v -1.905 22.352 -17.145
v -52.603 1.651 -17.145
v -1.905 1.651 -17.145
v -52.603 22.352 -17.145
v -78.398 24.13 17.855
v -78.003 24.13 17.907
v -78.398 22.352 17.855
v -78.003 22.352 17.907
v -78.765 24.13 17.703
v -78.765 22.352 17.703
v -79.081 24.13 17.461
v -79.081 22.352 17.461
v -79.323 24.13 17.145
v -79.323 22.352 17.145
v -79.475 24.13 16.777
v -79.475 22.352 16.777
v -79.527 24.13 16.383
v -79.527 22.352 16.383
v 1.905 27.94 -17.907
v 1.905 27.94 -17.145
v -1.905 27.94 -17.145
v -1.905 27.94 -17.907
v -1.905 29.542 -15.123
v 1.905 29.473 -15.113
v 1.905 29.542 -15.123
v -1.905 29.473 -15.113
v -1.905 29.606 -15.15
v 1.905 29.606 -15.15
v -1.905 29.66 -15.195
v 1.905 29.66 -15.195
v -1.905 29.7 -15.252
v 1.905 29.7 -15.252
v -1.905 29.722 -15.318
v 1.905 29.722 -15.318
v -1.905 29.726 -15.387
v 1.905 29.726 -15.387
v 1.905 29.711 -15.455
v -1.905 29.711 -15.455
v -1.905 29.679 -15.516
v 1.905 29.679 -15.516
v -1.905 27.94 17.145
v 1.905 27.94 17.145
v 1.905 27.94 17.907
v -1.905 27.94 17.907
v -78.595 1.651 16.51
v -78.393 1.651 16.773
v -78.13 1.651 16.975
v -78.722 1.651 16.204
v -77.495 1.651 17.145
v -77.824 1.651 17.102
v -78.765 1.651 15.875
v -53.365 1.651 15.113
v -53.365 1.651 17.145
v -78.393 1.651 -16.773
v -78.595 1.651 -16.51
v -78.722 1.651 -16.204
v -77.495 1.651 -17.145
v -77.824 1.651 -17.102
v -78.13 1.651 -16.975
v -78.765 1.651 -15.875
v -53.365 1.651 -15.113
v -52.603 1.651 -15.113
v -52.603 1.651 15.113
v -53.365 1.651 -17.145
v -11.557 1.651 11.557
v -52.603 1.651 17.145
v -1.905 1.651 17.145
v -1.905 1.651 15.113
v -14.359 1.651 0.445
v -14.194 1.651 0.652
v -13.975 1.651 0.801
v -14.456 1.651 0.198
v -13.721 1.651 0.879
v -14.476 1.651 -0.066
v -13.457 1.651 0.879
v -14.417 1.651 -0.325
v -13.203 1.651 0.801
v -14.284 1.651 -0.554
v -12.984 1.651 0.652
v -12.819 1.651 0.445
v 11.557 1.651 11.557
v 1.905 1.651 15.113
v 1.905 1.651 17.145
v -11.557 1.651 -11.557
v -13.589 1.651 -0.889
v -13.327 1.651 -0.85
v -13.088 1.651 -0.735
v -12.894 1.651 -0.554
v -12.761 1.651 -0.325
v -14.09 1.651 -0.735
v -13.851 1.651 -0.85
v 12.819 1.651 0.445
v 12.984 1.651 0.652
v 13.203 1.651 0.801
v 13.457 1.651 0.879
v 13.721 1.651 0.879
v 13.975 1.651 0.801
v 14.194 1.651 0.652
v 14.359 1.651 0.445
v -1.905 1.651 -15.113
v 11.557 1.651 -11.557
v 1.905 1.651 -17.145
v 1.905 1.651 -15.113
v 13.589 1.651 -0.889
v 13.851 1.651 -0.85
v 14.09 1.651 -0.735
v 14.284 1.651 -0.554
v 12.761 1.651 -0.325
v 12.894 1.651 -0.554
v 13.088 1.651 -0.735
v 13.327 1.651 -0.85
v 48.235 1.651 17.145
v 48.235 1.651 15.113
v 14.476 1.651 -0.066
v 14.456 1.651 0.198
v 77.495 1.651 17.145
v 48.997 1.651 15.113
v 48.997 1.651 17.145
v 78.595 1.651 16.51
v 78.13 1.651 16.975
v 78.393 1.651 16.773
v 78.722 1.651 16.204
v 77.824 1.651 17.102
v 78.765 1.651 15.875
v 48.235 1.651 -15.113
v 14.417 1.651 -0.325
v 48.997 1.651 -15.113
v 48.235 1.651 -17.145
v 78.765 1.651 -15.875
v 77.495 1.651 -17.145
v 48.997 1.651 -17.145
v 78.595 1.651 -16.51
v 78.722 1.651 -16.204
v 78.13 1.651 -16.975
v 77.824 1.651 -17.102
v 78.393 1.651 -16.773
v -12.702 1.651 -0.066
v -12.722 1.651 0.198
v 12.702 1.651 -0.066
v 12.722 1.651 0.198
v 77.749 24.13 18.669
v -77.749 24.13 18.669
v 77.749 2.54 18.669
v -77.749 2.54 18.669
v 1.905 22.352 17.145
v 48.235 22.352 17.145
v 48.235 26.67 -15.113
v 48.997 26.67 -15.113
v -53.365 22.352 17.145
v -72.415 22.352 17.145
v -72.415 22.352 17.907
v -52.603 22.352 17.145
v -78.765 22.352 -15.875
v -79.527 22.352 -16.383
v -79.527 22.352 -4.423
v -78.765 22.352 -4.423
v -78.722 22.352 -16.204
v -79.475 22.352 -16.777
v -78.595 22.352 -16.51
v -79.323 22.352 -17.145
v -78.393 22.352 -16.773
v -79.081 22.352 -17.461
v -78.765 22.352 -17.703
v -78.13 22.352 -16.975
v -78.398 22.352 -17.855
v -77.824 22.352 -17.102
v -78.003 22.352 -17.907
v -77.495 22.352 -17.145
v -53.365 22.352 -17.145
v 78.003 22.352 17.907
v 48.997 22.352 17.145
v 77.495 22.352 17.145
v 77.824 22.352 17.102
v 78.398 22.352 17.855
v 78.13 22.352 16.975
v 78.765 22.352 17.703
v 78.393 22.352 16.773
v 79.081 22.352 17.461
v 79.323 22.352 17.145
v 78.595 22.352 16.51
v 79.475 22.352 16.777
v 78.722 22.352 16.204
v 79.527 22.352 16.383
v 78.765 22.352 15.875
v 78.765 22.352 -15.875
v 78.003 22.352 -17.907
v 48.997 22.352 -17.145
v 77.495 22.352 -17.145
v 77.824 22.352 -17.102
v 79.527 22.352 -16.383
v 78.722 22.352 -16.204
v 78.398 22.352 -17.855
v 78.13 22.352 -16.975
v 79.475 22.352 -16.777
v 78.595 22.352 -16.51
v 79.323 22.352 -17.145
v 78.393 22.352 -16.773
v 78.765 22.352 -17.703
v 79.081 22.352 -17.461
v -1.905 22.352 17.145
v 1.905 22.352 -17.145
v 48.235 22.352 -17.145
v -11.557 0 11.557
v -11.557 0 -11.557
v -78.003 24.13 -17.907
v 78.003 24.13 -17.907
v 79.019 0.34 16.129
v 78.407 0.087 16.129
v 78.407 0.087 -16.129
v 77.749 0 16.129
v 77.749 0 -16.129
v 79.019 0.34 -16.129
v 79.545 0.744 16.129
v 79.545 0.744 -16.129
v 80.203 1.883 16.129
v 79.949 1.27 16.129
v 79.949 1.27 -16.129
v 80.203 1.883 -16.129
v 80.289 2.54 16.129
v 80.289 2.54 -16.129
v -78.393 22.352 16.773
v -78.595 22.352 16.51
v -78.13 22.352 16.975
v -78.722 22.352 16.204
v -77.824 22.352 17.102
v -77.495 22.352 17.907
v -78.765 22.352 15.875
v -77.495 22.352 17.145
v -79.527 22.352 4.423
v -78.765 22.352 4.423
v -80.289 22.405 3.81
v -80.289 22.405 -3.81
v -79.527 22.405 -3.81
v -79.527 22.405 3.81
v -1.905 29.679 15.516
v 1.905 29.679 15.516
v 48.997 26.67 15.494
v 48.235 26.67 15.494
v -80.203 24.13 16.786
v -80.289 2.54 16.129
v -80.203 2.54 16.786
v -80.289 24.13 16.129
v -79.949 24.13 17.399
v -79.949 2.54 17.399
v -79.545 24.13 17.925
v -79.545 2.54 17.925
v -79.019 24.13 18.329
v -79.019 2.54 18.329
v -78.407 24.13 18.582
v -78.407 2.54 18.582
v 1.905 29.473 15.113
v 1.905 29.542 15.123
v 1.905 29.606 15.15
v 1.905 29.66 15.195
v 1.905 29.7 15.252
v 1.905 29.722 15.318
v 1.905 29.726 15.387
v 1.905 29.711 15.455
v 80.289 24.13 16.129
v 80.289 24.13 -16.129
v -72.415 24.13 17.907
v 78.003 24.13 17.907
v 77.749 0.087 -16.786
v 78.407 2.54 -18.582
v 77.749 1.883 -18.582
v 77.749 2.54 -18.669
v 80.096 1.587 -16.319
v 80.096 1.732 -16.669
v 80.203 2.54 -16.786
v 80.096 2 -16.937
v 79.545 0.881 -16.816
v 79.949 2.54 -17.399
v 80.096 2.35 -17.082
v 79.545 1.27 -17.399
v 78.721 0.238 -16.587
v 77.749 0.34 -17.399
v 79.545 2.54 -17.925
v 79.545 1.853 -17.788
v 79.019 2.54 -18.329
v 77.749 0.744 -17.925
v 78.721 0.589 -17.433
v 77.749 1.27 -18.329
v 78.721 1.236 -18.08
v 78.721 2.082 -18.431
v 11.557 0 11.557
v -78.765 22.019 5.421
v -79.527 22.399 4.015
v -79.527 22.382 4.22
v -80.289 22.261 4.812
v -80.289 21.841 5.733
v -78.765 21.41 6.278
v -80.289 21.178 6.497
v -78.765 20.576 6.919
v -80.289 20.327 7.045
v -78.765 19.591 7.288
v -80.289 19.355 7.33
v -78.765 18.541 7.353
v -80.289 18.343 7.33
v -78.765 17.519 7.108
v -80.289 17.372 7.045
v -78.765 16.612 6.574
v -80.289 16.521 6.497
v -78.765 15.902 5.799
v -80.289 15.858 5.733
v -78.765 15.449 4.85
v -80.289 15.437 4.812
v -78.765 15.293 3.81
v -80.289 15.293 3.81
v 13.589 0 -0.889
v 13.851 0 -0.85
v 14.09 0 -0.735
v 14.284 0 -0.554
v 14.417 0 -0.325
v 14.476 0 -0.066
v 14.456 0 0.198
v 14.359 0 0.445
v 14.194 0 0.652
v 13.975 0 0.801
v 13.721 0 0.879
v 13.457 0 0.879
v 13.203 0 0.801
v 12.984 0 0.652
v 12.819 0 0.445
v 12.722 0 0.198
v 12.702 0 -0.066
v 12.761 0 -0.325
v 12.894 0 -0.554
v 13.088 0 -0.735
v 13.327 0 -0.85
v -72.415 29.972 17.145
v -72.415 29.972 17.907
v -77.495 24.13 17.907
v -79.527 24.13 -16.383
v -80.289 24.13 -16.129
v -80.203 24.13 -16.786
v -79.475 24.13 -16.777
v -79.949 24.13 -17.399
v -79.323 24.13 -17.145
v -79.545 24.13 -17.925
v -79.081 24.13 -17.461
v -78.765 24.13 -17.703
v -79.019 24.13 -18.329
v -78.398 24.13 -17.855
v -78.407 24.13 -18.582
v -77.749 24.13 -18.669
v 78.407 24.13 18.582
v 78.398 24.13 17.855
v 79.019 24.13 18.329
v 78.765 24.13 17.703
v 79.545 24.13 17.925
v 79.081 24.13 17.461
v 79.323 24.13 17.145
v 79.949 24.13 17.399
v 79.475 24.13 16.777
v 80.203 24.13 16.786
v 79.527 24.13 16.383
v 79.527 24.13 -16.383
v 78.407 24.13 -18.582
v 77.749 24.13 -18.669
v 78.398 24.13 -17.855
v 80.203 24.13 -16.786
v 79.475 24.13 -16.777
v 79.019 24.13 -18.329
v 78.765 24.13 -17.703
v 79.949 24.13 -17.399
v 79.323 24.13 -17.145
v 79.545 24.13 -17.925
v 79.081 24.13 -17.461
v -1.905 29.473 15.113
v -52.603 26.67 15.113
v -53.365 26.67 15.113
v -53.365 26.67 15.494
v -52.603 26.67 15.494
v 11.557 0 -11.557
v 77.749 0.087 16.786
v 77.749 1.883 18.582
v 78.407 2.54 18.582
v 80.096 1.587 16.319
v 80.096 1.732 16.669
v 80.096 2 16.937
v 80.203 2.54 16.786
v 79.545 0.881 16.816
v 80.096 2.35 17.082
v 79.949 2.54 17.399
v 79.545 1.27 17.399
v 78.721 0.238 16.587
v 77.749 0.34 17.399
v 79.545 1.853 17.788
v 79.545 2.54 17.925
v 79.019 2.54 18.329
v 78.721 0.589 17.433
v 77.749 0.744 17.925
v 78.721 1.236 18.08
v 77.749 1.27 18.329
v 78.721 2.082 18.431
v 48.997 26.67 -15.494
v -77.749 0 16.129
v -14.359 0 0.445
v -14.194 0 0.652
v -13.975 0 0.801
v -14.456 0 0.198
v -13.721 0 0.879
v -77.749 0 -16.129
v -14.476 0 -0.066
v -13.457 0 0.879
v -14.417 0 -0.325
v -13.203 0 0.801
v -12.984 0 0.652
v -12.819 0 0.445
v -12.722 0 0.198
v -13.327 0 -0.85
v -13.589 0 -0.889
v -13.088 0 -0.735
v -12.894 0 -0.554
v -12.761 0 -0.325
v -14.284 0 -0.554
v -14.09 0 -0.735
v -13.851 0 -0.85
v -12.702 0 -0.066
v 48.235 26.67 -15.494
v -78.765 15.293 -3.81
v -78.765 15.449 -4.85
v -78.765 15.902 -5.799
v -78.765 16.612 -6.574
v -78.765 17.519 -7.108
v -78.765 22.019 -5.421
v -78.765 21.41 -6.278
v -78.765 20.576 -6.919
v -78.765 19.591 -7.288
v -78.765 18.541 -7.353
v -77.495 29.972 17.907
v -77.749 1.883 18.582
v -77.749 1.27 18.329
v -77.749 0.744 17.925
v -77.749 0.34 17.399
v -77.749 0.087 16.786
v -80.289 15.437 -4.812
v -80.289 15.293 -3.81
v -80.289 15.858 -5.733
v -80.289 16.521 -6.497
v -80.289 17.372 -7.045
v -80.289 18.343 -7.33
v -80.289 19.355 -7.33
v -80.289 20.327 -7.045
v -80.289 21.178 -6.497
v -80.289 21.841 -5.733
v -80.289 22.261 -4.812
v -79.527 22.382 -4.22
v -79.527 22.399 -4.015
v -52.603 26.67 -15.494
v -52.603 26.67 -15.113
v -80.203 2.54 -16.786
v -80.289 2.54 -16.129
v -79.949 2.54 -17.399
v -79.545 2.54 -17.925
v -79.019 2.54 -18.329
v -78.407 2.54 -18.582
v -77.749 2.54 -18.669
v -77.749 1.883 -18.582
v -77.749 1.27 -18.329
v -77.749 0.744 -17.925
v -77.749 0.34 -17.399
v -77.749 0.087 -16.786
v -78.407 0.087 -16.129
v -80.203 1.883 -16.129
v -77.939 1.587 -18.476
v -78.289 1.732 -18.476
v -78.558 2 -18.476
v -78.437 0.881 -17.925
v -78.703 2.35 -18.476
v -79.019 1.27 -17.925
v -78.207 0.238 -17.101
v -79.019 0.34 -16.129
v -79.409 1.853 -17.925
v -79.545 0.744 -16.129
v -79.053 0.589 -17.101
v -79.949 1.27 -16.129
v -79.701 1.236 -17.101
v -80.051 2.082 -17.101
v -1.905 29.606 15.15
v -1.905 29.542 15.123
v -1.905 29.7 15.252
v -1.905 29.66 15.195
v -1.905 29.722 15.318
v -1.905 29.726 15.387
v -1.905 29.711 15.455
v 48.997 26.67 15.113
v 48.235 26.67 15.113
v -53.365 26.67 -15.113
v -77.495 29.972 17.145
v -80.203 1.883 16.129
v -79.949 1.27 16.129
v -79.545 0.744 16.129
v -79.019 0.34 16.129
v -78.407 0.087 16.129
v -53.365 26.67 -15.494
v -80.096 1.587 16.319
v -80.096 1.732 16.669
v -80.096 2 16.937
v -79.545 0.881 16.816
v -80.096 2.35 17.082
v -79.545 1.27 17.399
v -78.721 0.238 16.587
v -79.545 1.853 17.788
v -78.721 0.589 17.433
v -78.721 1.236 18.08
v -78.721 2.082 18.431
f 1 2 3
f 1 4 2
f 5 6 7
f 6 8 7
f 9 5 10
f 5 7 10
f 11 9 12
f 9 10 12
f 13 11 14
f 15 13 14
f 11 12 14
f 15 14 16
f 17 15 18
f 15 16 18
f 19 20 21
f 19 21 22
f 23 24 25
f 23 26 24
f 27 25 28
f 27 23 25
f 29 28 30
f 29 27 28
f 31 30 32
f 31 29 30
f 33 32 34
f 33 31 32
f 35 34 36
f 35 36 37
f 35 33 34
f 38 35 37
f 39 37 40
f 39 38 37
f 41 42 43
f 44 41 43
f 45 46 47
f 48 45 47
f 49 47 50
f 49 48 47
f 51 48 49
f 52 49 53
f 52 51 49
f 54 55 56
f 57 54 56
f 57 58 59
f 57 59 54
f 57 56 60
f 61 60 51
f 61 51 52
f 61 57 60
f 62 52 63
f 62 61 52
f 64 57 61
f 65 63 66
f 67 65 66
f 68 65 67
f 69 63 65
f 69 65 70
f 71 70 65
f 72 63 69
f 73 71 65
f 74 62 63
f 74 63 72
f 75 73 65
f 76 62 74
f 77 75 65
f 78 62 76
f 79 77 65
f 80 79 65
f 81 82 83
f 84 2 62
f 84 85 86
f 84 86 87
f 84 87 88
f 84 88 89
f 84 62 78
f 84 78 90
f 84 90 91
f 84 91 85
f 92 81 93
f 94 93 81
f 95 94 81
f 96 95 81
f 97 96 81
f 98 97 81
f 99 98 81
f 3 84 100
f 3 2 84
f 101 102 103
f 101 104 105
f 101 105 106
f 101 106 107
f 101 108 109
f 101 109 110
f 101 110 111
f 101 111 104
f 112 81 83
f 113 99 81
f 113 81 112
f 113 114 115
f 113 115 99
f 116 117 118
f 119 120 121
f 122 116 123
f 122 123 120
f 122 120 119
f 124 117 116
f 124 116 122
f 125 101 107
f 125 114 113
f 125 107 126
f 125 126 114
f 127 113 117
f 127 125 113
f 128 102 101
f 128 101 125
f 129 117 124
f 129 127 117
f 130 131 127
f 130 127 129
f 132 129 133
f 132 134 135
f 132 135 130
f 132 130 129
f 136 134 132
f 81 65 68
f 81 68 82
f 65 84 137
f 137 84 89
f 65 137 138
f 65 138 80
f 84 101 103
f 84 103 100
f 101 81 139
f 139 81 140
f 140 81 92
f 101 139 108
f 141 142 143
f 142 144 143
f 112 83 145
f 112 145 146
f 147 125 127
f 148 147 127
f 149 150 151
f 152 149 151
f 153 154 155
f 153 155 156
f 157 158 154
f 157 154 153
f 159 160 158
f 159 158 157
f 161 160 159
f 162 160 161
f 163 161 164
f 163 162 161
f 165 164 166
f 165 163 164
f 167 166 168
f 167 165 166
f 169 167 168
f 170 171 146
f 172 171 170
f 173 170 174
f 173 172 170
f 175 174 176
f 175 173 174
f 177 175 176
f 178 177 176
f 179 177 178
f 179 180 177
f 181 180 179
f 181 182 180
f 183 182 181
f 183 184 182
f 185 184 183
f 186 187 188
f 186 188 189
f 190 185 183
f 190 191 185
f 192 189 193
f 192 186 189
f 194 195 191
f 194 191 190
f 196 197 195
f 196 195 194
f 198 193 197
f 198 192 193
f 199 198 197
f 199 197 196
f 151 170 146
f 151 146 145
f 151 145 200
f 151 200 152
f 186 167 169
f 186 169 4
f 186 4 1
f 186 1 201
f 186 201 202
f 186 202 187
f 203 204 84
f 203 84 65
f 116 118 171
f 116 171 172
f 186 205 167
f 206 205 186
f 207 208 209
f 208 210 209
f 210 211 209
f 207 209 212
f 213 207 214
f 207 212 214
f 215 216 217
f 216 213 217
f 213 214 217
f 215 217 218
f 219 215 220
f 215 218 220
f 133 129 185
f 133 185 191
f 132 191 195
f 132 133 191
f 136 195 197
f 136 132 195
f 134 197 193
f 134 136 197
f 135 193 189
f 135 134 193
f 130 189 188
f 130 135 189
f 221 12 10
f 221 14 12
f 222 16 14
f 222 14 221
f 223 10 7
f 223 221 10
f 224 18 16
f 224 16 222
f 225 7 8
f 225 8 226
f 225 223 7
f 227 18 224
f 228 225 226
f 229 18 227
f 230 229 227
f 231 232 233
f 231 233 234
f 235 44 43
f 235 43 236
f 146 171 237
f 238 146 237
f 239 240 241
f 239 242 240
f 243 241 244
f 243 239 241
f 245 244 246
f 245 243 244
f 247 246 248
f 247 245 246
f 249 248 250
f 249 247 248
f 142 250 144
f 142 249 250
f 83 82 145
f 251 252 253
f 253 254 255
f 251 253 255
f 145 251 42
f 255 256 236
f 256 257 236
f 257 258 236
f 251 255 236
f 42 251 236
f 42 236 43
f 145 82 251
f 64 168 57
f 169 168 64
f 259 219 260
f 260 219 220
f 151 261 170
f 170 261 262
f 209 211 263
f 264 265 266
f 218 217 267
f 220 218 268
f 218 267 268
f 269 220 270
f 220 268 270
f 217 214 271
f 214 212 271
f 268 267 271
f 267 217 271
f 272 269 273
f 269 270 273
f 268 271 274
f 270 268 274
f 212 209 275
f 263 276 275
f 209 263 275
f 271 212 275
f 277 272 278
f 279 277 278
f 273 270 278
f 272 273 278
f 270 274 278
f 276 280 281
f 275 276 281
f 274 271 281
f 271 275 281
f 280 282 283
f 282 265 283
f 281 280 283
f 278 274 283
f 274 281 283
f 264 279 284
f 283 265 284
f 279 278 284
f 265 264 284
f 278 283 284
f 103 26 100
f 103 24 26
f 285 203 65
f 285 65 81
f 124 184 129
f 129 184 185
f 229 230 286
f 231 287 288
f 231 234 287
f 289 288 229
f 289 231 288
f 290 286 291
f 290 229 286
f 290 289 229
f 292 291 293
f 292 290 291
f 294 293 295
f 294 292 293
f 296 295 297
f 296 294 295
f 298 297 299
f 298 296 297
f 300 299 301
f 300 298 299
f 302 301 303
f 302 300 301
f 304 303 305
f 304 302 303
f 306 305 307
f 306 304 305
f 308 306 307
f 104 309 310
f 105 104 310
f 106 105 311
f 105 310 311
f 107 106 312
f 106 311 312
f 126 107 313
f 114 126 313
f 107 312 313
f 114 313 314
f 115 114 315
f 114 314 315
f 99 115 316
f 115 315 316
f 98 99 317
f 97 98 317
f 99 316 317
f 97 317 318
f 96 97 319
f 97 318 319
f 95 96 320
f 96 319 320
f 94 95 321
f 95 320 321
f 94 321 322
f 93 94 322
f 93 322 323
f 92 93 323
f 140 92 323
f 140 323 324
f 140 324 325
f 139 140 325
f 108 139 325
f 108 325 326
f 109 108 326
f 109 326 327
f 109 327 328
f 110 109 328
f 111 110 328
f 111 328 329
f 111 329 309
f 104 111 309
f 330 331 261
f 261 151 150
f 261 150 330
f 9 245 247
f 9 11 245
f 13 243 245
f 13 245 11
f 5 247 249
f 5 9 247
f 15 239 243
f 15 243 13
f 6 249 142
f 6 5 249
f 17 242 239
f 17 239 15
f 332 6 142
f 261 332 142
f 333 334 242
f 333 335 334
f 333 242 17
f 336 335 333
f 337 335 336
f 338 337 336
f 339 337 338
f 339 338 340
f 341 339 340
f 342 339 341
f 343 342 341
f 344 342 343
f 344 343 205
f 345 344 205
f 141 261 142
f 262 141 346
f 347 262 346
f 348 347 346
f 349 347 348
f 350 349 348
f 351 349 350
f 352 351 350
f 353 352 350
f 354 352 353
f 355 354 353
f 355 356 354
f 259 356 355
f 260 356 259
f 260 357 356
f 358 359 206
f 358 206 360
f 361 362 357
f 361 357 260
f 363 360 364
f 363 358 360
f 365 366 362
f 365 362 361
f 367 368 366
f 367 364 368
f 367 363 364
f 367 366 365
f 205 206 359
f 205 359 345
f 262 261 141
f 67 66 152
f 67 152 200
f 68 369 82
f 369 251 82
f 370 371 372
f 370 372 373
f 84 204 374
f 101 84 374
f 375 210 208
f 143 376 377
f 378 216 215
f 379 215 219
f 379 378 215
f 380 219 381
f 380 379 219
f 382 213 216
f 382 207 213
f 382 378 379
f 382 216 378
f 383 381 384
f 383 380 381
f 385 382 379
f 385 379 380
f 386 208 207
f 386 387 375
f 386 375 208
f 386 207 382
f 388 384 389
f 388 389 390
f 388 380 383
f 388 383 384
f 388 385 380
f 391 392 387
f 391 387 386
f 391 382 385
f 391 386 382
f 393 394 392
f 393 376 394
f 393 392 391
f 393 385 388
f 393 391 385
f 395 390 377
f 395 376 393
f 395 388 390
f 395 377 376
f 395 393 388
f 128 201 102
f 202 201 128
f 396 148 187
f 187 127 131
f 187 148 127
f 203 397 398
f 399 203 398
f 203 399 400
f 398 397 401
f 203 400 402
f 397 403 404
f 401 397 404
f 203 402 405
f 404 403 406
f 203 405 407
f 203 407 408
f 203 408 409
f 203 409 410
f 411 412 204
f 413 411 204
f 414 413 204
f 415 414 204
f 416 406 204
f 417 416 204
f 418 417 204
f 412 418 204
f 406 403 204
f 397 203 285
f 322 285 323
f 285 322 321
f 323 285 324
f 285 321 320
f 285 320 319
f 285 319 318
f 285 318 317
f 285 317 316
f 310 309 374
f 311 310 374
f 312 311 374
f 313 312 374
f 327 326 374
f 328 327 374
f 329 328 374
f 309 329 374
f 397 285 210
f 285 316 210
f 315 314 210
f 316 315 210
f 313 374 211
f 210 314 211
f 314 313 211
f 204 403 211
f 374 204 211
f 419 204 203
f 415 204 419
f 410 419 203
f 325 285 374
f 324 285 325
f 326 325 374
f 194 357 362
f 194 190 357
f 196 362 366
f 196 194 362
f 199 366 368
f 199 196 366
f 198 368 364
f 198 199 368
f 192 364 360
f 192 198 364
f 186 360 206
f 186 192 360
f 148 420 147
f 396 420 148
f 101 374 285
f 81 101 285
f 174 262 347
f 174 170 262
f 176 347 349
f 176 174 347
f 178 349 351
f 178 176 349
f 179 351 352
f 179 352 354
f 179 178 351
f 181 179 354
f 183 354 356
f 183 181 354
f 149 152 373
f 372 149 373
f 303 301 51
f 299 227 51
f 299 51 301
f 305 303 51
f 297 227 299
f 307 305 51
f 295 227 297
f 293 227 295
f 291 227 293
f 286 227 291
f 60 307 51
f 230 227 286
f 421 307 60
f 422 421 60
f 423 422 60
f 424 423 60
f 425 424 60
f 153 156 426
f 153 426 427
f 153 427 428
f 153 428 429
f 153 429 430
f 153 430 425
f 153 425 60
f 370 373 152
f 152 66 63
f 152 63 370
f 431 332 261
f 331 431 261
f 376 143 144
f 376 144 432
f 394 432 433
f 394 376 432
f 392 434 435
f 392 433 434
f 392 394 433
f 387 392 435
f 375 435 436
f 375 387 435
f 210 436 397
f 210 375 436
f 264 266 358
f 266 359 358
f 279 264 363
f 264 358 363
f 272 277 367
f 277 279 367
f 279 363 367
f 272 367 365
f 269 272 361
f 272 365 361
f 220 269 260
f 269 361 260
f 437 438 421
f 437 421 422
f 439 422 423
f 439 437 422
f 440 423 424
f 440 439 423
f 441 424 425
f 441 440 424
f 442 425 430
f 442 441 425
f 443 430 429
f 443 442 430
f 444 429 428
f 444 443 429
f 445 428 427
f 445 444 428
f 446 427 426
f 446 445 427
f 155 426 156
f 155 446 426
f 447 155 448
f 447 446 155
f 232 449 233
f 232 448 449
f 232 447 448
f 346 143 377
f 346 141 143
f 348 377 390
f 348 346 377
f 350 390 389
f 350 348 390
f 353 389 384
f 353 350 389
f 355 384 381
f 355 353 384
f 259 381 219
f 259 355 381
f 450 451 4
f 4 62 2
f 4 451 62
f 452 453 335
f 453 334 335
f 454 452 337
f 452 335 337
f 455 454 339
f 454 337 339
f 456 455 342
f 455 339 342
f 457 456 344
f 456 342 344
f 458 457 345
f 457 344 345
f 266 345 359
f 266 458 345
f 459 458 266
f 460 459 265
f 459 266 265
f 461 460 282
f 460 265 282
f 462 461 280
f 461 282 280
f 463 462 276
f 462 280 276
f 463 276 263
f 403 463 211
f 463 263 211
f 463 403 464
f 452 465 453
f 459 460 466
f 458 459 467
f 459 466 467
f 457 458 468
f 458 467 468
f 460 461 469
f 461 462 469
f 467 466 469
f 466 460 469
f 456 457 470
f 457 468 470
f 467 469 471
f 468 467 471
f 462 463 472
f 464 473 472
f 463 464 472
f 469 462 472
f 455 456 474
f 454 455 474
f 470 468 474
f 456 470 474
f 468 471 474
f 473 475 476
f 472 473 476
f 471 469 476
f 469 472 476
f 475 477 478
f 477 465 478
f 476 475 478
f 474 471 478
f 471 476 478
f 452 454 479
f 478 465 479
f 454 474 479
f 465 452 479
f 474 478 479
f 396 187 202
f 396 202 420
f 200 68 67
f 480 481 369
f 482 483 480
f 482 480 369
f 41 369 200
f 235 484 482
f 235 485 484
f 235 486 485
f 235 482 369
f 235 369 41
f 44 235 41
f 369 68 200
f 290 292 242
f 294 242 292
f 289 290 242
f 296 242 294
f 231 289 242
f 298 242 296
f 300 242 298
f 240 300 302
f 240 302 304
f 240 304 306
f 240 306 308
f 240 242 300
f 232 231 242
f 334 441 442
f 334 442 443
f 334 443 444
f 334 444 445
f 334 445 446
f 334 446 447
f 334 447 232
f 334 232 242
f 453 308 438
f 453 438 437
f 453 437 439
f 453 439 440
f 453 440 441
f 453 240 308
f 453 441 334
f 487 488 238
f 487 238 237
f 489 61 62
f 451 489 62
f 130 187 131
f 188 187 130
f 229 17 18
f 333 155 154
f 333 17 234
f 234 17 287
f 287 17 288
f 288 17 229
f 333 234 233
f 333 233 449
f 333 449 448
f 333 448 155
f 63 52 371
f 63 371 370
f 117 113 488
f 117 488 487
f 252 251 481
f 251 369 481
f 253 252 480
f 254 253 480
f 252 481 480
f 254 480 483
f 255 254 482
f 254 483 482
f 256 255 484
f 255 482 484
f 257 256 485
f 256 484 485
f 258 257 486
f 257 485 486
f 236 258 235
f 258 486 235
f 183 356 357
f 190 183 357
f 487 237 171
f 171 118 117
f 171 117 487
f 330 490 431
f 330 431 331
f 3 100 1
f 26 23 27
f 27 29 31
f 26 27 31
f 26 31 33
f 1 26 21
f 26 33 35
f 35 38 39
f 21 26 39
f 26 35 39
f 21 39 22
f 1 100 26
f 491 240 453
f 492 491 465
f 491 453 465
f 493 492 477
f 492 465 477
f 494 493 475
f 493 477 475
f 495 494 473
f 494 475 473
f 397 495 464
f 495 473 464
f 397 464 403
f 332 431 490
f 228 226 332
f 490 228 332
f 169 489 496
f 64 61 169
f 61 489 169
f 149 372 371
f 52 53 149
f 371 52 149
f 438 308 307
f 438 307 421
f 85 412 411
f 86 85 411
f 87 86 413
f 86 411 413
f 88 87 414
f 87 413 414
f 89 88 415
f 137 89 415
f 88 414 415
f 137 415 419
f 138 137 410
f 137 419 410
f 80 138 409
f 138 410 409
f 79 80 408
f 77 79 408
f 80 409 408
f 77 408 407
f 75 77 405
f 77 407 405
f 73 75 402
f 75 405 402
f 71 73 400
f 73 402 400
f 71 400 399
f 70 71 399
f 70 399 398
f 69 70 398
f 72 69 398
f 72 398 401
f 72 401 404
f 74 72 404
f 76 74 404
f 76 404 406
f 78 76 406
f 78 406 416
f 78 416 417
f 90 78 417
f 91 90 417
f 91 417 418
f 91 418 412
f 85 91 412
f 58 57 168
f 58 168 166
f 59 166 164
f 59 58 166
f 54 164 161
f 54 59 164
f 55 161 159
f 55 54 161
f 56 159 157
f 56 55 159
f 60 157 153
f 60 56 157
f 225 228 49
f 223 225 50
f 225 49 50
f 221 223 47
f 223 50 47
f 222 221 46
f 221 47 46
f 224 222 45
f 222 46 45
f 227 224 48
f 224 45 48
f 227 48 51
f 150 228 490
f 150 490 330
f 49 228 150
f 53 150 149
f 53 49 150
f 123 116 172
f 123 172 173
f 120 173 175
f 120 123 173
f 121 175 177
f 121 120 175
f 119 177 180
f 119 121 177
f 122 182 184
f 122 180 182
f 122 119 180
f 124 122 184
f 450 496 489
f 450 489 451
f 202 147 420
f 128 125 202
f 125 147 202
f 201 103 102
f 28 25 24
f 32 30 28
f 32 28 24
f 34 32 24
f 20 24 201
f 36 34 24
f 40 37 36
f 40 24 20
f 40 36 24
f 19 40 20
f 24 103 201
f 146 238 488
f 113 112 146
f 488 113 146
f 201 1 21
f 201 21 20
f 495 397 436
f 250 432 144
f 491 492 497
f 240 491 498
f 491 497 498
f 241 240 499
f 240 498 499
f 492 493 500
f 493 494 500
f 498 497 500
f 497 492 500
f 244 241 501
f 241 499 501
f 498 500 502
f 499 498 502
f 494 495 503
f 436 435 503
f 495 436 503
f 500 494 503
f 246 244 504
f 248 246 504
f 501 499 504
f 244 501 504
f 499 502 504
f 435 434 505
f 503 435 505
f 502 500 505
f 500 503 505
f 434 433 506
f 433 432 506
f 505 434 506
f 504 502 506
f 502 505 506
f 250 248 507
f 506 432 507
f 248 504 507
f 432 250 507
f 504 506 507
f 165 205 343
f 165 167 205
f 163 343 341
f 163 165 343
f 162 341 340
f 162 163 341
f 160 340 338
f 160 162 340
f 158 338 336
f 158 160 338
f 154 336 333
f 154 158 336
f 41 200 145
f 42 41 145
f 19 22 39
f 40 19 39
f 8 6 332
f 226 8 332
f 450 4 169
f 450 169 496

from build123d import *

# Parameters (mm, degrees)
SKETCH1_W            = 160.5788
SKETCH1_H            = 37.338
BOSS_EXTRUDE1_DEPTH  = 24.13
SKETCH2_W            = 157.5308
SKETCH2_H            = 34.29
CUT_EXTRUDE3_DEPTH   = 22.479
FILLET1_R            = 2.54
FILLET2_R            = 1.27
CUT_EXTRUDE4_REACH   = 165.451
SKETCH4_W            = 159.0548
SKETCH4_H            = 35.814
CUT_EXTRUDE5_DEPTH   = 1.778
FILLET3_R            = 1.524
SKETCH5_W            = 5.08
SKETCH5_H            = 0.762
BOSS_EXTRUDE2_DEPTH  = 7.62
SKETCH6_W            = 0.762
SKETCH6_H            = 2.032
BOSS_EXTRUDE3_DEPTH  = 25.019
LPATTERN1_COUNT      = 2
LPATTERN1_PITCH      = 101.6
LPATTERN1_COUNT_DIR2 = 2
LPATTERN1_PITCH_DIR2 = 32.258
CUT_EXTRUDE6_REACH   = 136.021
SKETCH8_W            = 3.81
SKETCH8_H            = 2.032
BOSS_EXTRUDE4_DEPTH  = 26.289
BOSS_EXTRUDE9_DEPTH  = 3.81
FILLET4_R            = 0.254
FILLET4_OF_MIRROR2_R = 0.254
SKETCH10_R           = 0.889
SKETCH10_W           = 23.114
SKETCH10_H           = 23.114
CUT_EXTRUDE7_DEPTH   = 88.711117296


with BuildPart() as part:
    # Sketch1 → Boss-Extrude1 (new body)
    with BuildSketch(Plane(origin=(0, 0, 0), x_dir=(1, 0, 0), z_dir=(0, 1, 0))):
        Rectangle(SKETCH1_W, SKETCH1_H)
    extrude(amount=BOSS_EXTRUDE1_DEPTH)

    # Sketch2 → Cut-Extrude3 (cut)
    with BuildSketch(Plane(origin=(0, 24.13, 0), x_dir=(1, 0, 0), z_dir=(0, 1, 0))):
        Rectangle(SKETCH2_W, SKETCH2_H)
    extrude(amount=-CUT_EXTRUDE3_DEPTH, mode=Mode.SUBTRACT)

    # Fillet1
    fillet1_edges = [part.edges().sort_by_distance(p)[0] for p in [
        (0, 0, 18.669),
        (-80.2894, 0, 0),
        (0, 0, -18.669),
        (80.2894, 0, 0),
        (80.2894, 12.065, 18.669),
        (-80.2894, 12.065, 18.669),
        (-80.2894, 12.065, -18.669),
        (80.2894, 12.065, -18.669),
    ]]
    fillet(fillet1_edges, radius=FILLET1_R)

    # Fillet2
    fillet2_edges = [part.edges().sort_by_distance(p)[0] for p in [
        (-78.7654, 12.8905, -17.145),
        (-78.7654, 12.8905, 17.145),
        (78.7654, 12.8905, 17.145),
        (78.7654, 12.8905, -17.145),
    ]]
    fillet(fillet2_edges, radius=FILLET2_R)

    # Sketch3 → Cut-Extrude4 (cut, up to next)
    with BuildSketch(Plane.ZY.offset(80.2894), mode=Mode.PRIVATE) as cut_extrude4_sk1:
        with BuildLine():
            Line((3.81, 15.2933146), (-3.81, 15.2933146))
            ThreePointArc((-3.81, 15.2933146), (-7.366, 18.8493146), (-3.81, 22.4053146))
            Line((-3.81, 22.4053146), (3.81, 22.4053146))
            ThreePointArc((3.81, 22.4053146), (7.366, 18.8493146), (3.81, 15.2933146))
        make_face()
    cut_extrude4_tool1 = extrude(cut_extrude4_sk1.sketch, amount=-CUT_EXTRUDE4_REACH, mode=Mode.PRIVATE) & part.part
    add(cut_extrude4_tool1.solids().sort_by_distance((-80.2894, 18.849315, 0))[0], mode=Mode.SUBTRACT)

    # Sketch4 → Cut-Extrude5 (cut)
    with BuildSketch(Plane(origin=(0, 24.13, 0), x_dir=(1, 0, 0), z_dir=(0, 1, 0))):
        Rectangle(SKETCH4_W, SKETCH4_H)
    extrude(amount=-CUT_EXTRUDE5_DEPTH, mode=Mode.SUBTRACT)

    # Fillet3
    fillet3_edges = [part.edges().sort_by_distance(p)[0] for p in [
        (-79.5274, 23.241, 17.907),
        (-79.5274, 23.241, -17.907),
        (79.5274, 23.241, -17.907),
        (79.5274, 23.241, 17.907),
    ]]
    fillet(fillet3_edges, radius=FILLET3_R)

    # Sketch5 → Boss-Extrude2 (add)
    with BuildSketch(Plane(origin=(0, 22.352, 0), x_dir=(1, 0, 0), z_dir=(0, 1, 0))):
        with Locations((-74.9554, -17.526)):
            Rectangle(SKETCH5_W, SKETCH5_H)
    extrude(amount=BOSS_EXTRUDE2_DEPTH)

    # Sketch6 → Boss-Extrude3 (add)
    with BuildSketch(Plane(origin=(0, 1.651, 0), x_dir=(1, 0, 0), z_dir=(0, 1, 0))):
        with Locations((-52.9844, 16.129)):
            Rectangle(SKETCH6_W, SKETCH6_H)
    boss_extrude3 = extrude(amount=BOSS_EXTRUDE3_DEPTH)

    # LPattern1: Boss-Extrude3 2 × 2
    with Locations(*[(i * LPATTERN1_PITCH, 0, j * LPATTERN1_PITCH_DIR2) for i in range(LPATTERN1_COUNT) for j in range(LPATTERN1_COUNT_DIR2) if (i, j) != (0, 0)]):
        add(boss_extrude3)

    # Cut-Extrude6: up to this face of the body (flat: up to its plane)
    cut_extrude6_end = Plane(part.part.faces().sort_by_distance((-53.3654, 14.1605, -16.129))[0])
    # Sketch7 → Cut-Extrude6 (cut, up to the picked face)
    with BuildSketch(Plane(origin=(48.9966, 0, 0), x_dir=(0, 0, -1), z_dir=(1, 0, 0)), mode=Mode.PRIVATE) as cut_extrude6_sk1:
        Polygon((17.145, 22.352), (15.494, 26.67), (17.145, 26.67), align=None)
    cut_extrude6_tool1 = split(extrude(cut_extrude6_sk1.sketch, amount=-CUT_EXTRUDE6_REACH, mode=Mode.PRIVATE), bisect_by=cut_extrude6_end, keep=Keep.BOTH, mode=Mode.PRIVATE)
    cut_extrude6 = cut_extrude6_tool1.solids().sort_by(Axis((48.9966, 25.230667, -16.594667), (-1, 0, 0)))[0]
    add(cut_extrude6, mode=Mode.SUBTRACT)

    # Mirror1: Cut-Extrude6 across plane
    add(cut_extrude6.mirror(Plane.XY), mode=Mode.SUBTRACT)

    # Sketch8 → Boss-Extrude4 (add)
    with BuildSketch(Plane(origin=(0, 1.651, 0), x_dir=(1, 0, 0), z_dir=(0, 1, 0))):
        with Locations((0, -16.129)):
            Rectangle(SKETCH8_W, SKETCH8_H)
        with Locations((0, 16.129)):
            Rectangle(SKETCH8_W, SKETCH8_H)
    extrude(amount=BOSS_EXTRUDE4_DEPTH)

    # Sketch9 → Boss-Extrude9 (add)
    with BuildSketch(Plane(origin=(1.905, 0, 0), x_dir=(0, 0, -1), z_dir=(1, 0, 0))):
        Polygon((-15.113, 27.94), (-17.907, 27.94), (-15.113, 29.972), align=None)
    boss_extrude9 = extrude(amount=-BOSS_EXTRUDE9_DEPTH)

    # Fillet4
    fillet4_edges = [part.edges().sort_by_distance(p)[0] for p in [
        (0, 29.972, 15.113),
    ]]
    fillet(fillet4_edges, radius=FILLET4_R)

    # Mirror2: Boss-Extrude9 across plane
    add(boss_extrude9.mirror(Plane.XY))

    # Fillet4 of Mirror2
    fillet4_of_mirror2_edges = [part.edges().sort_by_distance(p)[0] for p in [
        (0, 29.972, -15.113),
    ]]
    fillet(fillet4_of_mirror2_edges, radius=FILLET4_OF_MIRROR2_R)

    # Sketch10 → Cut-Extrude7 (cut, through all)
    with BuildSketch(Plane.XZ):
        with Locations(Location((-13.589, 0, 0), (0, 0, 270))):
            Circle(SKETCH10_R)
        with Locations(Location((13.589, 0, 0), (0, 0, 270))):
            Circle(SKETCH10_R)
        Rectangle(SKETCH10_W, SKETCH10_H)
    extrude(amount=-CUT_EXTRUDE7_DEPTH, mode=Mode.SUBTRACT)


solid = part.part
